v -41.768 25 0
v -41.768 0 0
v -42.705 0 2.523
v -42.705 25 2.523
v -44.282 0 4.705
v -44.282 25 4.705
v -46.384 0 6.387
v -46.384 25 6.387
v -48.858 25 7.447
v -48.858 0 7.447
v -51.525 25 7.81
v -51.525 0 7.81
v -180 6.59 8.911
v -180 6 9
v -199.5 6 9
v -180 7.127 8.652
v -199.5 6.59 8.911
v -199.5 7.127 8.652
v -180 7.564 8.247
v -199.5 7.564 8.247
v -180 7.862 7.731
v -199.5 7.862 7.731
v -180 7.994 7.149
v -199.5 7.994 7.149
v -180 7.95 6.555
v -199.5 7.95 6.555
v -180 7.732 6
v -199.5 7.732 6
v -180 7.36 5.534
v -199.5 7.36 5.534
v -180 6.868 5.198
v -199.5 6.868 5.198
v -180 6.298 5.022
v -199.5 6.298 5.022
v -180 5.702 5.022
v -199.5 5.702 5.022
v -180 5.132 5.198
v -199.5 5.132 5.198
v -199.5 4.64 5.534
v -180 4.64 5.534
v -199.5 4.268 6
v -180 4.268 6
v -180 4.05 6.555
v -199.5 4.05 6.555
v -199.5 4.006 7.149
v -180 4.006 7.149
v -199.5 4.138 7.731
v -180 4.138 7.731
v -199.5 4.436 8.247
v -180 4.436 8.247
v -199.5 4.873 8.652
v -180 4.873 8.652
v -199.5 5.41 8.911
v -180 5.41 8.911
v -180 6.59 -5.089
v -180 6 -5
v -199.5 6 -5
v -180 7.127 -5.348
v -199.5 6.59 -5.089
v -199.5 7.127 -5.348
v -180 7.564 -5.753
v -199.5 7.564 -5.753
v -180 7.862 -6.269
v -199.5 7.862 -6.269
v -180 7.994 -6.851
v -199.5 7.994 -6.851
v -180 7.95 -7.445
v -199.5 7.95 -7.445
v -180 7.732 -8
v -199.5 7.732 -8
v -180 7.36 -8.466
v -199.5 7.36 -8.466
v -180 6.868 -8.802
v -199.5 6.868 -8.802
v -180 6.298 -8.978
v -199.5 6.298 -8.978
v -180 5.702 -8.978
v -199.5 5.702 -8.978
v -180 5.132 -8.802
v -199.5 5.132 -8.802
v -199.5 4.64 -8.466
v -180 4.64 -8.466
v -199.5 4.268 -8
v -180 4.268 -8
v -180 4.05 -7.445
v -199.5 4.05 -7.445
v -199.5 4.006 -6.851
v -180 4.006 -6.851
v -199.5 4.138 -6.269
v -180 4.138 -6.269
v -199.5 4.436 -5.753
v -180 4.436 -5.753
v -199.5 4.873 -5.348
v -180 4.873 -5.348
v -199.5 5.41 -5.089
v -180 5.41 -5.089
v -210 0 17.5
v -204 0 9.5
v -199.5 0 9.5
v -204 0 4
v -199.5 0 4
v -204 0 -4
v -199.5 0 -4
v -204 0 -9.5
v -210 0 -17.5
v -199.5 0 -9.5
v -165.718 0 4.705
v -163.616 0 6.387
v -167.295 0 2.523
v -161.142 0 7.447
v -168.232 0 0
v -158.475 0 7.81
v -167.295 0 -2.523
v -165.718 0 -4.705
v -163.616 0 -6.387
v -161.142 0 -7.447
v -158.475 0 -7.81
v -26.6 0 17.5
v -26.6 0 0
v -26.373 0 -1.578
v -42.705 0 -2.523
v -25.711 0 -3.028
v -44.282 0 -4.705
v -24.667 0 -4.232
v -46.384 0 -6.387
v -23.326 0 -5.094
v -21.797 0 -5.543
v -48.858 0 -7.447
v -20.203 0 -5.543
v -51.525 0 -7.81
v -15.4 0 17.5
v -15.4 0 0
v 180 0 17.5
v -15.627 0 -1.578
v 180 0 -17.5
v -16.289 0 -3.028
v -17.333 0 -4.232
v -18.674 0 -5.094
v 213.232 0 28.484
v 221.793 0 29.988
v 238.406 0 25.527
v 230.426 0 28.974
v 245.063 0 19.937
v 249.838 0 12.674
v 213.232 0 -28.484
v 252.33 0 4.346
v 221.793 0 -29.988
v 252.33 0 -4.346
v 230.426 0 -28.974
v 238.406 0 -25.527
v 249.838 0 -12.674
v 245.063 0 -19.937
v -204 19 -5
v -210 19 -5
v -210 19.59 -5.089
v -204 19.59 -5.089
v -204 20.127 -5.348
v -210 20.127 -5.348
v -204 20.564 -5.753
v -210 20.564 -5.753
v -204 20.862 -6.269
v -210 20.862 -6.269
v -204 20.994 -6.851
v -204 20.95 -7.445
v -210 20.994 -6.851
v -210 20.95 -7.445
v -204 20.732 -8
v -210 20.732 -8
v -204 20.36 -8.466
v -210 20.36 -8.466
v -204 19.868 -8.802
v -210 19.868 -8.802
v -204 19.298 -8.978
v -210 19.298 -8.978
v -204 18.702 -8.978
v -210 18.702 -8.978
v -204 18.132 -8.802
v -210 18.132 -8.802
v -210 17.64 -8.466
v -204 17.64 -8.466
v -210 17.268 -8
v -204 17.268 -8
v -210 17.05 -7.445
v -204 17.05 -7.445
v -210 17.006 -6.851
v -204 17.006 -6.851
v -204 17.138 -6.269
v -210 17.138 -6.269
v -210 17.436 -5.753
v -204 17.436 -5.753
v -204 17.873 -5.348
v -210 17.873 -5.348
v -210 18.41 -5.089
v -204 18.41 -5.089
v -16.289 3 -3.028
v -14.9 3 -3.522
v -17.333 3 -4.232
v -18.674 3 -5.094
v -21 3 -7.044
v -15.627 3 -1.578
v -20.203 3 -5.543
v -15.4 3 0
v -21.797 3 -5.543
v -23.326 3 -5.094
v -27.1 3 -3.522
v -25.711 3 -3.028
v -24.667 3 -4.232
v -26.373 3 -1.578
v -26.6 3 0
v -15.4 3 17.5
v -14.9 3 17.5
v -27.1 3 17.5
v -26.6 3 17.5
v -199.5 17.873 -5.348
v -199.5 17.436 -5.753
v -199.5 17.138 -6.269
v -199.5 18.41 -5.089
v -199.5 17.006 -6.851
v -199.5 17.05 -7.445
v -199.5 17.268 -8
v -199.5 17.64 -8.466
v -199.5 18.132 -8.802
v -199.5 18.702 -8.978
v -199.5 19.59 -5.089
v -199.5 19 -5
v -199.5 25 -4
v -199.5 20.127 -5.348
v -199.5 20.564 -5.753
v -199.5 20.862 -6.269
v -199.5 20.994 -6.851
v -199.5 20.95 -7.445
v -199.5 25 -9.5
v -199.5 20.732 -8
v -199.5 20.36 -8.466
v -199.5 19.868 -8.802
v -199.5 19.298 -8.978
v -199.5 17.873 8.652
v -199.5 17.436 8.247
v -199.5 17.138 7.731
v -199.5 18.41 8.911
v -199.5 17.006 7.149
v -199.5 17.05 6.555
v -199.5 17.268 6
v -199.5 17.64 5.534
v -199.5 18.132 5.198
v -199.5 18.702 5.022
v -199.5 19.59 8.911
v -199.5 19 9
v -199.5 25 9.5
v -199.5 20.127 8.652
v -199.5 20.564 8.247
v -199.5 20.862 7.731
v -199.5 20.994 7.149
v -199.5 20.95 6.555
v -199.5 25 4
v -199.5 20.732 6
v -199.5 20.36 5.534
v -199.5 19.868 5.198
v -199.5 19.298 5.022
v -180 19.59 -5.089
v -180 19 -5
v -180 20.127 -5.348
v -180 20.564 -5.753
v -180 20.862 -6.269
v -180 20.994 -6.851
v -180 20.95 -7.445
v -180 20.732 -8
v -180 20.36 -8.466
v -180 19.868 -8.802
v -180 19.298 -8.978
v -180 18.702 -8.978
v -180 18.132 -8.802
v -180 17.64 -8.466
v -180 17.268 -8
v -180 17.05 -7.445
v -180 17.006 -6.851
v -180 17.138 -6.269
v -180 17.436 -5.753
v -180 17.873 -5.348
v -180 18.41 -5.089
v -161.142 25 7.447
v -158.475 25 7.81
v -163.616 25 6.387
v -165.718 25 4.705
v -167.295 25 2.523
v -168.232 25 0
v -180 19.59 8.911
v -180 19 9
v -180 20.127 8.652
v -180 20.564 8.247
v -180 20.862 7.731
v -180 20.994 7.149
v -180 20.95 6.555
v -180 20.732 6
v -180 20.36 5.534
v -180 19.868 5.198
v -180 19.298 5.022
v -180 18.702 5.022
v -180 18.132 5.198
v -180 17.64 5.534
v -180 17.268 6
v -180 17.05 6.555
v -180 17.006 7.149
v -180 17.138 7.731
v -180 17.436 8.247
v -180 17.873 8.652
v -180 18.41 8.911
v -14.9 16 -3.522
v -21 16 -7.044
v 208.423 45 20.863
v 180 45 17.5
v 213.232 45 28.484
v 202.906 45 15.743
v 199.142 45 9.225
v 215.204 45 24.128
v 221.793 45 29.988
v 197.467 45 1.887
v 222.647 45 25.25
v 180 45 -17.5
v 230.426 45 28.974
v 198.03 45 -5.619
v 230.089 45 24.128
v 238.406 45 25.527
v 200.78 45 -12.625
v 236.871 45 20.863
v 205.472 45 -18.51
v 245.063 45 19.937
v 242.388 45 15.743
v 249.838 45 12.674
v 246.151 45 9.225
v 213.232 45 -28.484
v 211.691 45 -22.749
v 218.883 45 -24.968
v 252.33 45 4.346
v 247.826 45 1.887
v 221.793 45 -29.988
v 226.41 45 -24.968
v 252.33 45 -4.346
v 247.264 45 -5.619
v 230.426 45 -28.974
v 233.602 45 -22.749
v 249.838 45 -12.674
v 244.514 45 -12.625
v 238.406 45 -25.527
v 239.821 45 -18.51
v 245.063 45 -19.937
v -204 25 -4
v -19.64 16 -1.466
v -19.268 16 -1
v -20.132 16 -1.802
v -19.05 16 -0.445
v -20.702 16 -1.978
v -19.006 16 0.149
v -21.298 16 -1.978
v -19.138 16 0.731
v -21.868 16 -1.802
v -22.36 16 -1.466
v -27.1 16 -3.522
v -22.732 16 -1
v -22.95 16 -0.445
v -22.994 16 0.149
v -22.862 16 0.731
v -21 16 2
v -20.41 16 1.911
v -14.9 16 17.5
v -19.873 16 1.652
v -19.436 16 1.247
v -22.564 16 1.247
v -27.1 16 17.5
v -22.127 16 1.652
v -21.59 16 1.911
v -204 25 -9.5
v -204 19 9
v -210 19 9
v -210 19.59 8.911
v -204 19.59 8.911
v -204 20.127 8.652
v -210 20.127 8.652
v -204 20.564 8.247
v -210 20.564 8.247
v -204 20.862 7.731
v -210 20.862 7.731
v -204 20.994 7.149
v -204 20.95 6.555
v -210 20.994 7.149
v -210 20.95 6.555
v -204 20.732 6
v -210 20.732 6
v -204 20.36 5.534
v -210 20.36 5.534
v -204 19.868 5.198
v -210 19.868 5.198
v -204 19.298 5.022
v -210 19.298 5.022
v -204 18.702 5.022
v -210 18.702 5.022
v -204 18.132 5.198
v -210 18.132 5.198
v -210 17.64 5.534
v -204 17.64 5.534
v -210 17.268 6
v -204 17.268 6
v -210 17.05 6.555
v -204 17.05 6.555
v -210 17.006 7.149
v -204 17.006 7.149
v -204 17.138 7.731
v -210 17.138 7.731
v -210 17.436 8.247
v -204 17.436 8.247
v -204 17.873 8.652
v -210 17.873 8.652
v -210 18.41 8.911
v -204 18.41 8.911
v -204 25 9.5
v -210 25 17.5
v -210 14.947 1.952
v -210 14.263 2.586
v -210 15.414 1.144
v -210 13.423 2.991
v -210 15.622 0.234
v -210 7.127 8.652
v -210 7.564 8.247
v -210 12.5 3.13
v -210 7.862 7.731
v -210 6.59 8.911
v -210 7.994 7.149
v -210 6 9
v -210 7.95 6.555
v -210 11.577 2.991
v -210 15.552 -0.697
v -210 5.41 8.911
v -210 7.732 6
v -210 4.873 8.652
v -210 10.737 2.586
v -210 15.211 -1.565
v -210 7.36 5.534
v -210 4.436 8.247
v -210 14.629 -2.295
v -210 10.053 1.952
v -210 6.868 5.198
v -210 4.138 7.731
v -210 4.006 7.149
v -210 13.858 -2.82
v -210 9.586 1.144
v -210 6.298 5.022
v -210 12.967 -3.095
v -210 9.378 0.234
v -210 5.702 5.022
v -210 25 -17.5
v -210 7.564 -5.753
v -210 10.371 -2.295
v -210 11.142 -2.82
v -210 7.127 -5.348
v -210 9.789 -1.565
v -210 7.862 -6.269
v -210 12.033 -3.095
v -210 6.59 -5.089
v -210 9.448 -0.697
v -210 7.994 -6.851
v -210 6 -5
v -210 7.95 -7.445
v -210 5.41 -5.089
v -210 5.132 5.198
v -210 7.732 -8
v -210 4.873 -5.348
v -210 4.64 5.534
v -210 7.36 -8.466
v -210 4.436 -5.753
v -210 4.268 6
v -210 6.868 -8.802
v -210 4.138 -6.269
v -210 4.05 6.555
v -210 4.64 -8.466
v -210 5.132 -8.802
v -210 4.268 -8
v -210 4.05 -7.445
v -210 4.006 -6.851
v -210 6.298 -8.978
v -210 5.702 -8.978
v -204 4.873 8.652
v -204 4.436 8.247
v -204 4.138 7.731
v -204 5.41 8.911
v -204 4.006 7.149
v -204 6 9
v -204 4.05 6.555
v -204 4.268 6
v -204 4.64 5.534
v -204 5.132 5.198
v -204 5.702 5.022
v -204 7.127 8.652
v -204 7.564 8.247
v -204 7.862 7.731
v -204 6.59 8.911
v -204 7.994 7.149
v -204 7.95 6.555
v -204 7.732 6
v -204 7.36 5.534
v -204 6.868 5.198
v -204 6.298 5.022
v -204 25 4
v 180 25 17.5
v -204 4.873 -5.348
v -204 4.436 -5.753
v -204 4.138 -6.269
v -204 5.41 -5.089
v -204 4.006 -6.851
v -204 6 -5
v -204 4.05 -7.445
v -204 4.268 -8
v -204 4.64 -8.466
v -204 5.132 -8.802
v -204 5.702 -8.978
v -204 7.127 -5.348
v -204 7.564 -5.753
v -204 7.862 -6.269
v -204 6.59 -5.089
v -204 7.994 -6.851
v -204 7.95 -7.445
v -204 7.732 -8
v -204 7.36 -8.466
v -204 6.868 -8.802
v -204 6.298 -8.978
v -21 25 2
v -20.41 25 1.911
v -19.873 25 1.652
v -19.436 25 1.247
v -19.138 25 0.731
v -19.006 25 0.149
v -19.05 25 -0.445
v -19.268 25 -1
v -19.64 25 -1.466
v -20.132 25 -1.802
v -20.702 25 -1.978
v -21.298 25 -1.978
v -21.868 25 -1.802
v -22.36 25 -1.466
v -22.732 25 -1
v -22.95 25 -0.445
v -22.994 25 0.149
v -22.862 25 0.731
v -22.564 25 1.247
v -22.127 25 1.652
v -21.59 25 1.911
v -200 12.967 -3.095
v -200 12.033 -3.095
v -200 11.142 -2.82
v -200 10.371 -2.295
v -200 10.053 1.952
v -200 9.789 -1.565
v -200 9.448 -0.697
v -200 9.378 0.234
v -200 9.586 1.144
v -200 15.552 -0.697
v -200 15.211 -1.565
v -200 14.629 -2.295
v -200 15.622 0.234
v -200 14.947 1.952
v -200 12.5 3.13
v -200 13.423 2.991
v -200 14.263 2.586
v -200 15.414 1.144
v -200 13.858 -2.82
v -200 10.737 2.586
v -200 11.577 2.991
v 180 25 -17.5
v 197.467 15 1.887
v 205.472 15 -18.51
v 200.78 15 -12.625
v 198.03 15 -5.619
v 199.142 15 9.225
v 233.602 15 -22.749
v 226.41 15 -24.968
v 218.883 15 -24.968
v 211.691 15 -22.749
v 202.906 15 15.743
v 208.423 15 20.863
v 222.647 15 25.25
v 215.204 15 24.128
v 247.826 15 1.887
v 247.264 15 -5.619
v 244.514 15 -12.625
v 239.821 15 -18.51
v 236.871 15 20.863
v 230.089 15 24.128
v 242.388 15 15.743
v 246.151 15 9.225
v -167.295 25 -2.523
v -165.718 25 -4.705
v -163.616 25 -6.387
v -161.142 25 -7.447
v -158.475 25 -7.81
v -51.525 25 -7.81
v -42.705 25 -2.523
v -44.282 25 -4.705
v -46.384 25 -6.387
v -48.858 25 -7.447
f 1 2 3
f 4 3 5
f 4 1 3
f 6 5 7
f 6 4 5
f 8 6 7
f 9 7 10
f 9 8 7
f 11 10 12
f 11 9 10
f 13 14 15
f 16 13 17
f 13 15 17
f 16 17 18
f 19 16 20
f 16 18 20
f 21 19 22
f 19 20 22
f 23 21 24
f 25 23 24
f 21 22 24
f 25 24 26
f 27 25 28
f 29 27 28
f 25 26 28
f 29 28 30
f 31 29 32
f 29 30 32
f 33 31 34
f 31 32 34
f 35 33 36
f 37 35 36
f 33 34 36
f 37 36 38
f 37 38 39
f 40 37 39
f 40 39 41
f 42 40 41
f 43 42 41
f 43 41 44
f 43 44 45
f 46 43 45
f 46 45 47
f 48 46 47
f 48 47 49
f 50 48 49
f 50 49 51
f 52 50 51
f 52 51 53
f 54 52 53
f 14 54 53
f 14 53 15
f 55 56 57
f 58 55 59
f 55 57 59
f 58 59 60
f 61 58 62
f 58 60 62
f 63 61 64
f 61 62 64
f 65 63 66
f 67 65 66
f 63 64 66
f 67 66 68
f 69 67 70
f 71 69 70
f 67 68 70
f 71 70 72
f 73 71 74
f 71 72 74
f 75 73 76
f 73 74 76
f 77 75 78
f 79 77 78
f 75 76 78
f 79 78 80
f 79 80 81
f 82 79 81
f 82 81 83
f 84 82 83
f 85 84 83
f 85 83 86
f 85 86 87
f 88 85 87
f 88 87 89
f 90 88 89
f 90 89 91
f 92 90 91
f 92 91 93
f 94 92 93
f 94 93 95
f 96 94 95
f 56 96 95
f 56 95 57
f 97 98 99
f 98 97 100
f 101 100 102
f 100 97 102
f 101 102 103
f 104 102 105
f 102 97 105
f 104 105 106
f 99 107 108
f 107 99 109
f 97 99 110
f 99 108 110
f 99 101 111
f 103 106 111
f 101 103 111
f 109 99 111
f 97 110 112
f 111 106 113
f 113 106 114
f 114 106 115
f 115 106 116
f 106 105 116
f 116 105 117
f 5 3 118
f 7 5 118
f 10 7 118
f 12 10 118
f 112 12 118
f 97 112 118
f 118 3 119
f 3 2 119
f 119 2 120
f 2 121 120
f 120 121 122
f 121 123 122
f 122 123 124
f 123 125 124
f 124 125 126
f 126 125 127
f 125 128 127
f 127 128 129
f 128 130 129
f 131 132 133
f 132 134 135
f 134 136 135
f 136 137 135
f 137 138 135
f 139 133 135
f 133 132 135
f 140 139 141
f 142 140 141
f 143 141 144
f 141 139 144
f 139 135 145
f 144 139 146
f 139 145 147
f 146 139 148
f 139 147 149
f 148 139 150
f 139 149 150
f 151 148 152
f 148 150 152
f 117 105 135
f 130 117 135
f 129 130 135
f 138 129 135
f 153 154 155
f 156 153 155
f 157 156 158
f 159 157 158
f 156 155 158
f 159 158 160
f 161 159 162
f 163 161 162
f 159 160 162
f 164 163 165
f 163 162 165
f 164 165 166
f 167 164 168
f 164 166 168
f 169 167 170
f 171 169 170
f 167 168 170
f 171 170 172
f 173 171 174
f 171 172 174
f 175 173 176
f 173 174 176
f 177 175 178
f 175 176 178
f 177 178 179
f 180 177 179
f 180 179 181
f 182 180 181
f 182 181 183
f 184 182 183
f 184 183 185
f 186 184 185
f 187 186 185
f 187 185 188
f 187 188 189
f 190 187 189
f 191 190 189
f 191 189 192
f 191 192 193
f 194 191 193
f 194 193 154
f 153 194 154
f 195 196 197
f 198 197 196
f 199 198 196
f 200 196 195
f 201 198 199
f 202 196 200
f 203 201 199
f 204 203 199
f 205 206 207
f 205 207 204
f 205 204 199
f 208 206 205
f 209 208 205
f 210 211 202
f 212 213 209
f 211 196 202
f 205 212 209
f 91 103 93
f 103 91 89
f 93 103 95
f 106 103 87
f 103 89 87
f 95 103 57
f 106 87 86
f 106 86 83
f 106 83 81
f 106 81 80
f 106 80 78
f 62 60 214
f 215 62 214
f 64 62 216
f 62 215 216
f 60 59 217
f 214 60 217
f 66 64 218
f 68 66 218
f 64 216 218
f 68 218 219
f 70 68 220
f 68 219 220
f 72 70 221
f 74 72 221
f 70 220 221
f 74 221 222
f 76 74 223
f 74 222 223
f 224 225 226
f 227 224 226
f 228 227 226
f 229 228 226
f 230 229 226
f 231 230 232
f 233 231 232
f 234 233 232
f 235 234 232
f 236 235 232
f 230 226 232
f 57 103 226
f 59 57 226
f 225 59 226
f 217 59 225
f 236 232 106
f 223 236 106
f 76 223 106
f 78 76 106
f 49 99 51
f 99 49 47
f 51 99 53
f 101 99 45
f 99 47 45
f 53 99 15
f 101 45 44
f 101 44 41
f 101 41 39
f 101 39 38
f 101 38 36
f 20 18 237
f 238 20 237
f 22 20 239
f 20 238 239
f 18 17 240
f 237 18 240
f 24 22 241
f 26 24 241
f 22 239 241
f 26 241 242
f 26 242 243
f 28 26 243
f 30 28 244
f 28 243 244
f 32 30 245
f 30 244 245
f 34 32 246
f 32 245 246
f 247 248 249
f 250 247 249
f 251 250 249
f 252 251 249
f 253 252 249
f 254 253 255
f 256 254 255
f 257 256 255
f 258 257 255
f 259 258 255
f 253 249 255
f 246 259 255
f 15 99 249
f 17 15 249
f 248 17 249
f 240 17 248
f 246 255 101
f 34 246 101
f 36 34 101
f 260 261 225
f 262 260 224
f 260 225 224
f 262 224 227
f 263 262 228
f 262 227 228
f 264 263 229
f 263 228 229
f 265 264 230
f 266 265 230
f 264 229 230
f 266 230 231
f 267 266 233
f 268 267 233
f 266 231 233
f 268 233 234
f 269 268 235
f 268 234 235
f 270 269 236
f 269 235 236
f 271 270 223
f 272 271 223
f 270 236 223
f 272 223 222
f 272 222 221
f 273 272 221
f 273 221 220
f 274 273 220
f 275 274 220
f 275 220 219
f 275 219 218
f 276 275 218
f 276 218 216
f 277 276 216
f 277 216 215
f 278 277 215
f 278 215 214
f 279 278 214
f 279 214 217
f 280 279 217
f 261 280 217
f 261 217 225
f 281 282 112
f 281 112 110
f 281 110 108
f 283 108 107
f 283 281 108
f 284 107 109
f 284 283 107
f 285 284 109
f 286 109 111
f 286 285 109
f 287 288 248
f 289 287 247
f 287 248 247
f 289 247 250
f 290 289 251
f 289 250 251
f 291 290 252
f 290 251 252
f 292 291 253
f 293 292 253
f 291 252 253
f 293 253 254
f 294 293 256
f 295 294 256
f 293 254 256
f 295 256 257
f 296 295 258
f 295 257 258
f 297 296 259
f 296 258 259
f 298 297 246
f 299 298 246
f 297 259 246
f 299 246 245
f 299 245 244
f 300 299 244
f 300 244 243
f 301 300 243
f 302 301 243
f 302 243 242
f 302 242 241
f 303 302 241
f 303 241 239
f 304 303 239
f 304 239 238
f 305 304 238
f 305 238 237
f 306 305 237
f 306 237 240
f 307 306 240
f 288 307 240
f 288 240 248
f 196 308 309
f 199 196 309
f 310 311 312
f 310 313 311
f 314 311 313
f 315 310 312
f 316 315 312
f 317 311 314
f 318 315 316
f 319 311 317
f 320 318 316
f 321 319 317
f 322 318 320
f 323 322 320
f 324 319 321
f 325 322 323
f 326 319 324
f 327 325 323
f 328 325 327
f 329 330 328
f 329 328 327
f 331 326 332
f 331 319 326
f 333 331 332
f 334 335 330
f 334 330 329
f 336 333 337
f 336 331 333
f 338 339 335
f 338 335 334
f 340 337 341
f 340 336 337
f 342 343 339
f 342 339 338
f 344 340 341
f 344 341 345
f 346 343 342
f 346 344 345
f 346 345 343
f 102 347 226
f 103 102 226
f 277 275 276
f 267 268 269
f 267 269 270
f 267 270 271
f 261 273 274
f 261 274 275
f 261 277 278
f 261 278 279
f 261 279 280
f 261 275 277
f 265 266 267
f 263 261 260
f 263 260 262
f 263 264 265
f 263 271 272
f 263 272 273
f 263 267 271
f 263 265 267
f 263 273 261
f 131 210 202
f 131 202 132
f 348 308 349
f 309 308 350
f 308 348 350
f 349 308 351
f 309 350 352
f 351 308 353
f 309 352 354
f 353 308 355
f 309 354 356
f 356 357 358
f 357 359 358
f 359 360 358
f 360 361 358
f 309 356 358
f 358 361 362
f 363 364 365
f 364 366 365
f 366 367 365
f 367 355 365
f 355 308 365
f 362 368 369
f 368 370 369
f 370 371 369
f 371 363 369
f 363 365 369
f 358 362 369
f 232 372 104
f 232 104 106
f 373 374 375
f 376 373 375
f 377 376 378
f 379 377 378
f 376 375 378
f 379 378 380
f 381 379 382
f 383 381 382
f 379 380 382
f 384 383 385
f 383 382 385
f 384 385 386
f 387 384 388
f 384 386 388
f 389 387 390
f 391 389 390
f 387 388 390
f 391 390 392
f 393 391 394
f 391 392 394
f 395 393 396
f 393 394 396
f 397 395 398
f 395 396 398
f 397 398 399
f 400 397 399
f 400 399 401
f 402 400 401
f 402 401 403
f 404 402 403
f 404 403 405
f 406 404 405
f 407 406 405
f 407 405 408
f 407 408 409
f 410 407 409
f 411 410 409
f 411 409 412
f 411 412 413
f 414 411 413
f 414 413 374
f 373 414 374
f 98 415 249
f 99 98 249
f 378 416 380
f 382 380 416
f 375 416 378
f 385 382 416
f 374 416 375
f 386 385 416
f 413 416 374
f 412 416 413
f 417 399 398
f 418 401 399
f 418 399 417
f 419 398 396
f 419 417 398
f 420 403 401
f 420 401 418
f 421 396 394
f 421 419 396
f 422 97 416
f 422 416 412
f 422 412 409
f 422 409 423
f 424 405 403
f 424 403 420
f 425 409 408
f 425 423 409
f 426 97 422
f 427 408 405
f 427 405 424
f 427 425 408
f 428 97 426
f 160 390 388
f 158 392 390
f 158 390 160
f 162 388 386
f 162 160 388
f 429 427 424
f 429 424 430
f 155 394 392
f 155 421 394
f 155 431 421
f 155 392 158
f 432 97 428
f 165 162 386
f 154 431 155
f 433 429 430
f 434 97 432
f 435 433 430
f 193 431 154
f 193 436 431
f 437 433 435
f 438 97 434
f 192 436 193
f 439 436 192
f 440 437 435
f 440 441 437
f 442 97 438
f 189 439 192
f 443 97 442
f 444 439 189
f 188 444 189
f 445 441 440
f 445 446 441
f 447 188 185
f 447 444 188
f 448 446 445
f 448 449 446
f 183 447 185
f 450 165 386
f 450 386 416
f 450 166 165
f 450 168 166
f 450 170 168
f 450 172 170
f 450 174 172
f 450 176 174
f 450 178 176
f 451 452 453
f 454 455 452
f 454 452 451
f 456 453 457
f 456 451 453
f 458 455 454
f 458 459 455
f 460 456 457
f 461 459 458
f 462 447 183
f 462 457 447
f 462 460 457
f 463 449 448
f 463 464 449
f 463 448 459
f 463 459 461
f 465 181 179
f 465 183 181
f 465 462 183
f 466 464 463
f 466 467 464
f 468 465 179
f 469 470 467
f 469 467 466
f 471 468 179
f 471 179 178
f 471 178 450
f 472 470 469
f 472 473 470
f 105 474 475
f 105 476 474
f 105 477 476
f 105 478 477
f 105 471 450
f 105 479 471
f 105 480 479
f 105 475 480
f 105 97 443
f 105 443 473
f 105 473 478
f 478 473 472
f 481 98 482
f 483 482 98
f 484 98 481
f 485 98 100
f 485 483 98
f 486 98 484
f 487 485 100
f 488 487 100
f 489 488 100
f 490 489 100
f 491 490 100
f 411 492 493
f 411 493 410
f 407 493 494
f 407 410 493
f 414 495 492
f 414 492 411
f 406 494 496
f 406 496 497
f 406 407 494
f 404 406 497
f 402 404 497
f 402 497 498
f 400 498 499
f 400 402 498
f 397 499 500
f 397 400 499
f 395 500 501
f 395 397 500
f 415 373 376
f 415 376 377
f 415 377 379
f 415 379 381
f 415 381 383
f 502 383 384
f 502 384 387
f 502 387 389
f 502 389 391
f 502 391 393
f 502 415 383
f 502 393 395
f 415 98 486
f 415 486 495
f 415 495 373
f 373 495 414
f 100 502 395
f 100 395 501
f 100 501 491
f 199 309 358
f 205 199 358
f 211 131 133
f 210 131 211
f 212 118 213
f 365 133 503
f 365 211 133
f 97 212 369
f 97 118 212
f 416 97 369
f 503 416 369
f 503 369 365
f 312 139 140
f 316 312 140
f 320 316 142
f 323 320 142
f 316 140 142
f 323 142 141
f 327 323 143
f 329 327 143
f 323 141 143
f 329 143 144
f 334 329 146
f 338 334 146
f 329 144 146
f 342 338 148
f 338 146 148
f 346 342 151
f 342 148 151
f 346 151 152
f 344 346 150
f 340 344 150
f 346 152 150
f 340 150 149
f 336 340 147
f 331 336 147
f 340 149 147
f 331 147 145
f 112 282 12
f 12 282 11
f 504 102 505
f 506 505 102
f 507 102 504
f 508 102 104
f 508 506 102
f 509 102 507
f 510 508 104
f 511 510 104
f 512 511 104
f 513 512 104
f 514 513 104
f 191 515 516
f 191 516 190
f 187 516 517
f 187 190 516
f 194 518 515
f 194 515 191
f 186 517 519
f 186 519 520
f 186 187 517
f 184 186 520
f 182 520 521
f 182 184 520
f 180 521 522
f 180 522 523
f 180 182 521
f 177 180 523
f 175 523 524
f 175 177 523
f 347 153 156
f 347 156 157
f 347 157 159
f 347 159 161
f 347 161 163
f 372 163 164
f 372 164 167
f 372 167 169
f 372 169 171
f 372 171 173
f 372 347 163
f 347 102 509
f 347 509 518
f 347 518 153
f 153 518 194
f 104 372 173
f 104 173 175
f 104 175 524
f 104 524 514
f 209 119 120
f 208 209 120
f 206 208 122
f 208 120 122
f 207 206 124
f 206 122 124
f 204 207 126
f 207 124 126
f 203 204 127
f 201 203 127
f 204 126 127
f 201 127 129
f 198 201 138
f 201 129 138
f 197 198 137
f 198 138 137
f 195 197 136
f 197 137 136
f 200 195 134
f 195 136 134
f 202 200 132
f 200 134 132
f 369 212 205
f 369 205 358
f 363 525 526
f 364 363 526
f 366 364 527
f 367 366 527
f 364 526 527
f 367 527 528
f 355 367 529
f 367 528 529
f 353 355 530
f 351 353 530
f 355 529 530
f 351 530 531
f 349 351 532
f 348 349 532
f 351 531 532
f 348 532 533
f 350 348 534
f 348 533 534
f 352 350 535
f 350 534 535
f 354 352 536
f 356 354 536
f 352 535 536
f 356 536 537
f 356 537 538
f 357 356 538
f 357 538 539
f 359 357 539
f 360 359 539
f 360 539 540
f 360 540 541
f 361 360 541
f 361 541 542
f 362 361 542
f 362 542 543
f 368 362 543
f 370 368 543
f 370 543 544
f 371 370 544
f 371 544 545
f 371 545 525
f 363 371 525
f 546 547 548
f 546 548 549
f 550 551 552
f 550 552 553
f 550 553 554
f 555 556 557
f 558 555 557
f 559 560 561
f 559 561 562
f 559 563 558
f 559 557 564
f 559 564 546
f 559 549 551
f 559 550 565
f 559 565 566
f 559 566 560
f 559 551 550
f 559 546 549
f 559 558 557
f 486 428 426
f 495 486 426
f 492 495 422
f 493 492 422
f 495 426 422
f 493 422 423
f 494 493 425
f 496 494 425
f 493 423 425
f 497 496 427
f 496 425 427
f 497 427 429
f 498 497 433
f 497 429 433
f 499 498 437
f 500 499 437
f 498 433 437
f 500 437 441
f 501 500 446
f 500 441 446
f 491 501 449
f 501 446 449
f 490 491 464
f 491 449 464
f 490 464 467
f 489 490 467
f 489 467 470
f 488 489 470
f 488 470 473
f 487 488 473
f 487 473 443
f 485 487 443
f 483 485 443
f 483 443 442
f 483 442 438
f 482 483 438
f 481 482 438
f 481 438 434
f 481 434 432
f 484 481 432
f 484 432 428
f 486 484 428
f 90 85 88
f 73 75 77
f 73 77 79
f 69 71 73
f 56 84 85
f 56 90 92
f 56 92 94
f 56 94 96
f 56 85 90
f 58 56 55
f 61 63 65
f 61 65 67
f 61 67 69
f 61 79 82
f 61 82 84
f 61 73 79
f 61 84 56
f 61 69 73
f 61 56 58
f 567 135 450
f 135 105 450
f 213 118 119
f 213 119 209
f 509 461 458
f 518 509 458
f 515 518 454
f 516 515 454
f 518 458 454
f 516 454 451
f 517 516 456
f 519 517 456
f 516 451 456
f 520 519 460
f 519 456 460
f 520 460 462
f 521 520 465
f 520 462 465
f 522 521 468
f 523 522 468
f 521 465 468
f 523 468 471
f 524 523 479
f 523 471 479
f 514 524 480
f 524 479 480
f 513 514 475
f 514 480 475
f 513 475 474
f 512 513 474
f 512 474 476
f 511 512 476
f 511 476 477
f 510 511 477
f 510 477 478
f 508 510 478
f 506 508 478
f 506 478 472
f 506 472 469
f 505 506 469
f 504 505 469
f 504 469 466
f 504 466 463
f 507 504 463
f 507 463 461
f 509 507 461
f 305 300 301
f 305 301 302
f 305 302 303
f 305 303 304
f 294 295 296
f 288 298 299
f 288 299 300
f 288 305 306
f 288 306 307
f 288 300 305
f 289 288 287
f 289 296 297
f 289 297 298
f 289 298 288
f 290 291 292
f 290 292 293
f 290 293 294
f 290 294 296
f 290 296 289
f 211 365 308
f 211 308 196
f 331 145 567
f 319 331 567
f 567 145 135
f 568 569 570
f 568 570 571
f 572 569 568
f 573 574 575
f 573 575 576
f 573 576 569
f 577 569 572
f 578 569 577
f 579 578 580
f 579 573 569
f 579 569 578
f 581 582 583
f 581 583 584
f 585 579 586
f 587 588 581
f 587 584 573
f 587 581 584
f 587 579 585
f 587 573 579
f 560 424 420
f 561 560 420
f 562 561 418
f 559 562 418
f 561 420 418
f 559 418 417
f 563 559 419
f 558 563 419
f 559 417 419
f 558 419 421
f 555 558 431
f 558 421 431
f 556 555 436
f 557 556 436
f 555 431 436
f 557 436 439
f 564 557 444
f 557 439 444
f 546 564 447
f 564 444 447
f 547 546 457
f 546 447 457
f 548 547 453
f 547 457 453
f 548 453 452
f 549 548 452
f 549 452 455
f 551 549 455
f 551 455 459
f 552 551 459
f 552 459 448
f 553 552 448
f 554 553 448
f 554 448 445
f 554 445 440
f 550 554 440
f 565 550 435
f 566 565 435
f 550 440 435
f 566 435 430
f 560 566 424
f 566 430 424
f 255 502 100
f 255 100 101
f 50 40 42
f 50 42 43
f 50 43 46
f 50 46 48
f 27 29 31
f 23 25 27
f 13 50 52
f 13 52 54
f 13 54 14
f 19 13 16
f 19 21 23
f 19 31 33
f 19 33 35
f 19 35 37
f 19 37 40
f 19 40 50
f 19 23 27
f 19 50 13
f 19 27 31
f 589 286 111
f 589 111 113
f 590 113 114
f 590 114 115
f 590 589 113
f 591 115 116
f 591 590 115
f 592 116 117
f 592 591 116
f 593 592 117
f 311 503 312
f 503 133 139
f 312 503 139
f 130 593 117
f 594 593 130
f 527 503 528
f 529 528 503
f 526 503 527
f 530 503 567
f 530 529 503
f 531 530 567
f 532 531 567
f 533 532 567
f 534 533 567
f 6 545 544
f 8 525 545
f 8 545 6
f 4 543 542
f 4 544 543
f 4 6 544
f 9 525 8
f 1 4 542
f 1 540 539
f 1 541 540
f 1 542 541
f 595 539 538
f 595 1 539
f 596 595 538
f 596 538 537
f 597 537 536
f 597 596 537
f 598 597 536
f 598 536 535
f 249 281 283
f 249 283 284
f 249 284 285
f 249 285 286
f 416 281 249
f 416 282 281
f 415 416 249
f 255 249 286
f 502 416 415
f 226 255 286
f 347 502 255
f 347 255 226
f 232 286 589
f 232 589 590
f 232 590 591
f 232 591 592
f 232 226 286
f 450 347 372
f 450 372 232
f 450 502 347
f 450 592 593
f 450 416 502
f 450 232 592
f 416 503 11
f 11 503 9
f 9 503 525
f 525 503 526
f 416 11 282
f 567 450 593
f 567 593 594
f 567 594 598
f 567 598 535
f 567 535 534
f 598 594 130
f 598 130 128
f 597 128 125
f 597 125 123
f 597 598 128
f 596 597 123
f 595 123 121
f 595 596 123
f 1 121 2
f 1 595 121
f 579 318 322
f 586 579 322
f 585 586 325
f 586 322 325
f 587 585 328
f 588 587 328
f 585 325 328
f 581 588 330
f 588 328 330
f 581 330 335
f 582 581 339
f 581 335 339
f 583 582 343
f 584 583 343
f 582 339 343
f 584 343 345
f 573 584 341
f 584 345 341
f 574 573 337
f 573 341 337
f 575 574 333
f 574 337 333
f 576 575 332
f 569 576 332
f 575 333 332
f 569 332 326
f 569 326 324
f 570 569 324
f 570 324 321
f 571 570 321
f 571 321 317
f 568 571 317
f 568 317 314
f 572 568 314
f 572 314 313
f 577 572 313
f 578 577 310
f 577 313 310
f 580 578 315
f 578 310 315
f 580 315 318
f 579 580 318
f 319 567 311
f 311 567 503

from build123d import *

# Parameters (mm, degrees)
SKETCH2_W                = 210
SKETCH2_H                = 35
BOSS_EXTRUDE1_DEPTH      = 25
SKETCH3_R                = 5.6
CUT_EXTRUDE1_DEPTH       = 213.205678529
CUT_EXTRUDE2_DEPTH       = 22
SKETCH6_W                = 22.496439662
SKETCH6_H                = 9
BOSS_EXTRUDE3_DEPTH      = 38
CUT_EXTRUDE4_DEPTH       = 17.5
SKETCH9_R                = 2
CUT_EXTRUDE5_DEPTH       = 38
SKETCH10_R               = 2
CUT_EXTRUDE6_DEPTH       = 30
SKETCH12_W               = 4.5
SKETCH12_H               = 5.5
CUT_EXTRUDE7_DEPTH       = 46
SKETCH14_W               = 126.950126738
SKETCH14_H               = 15.619509634
CUT_EXTRUDE8_DEPTH       = 40
FILLET1_R                = 10
SKETCH17_W               = 35
SKETCH17_H               = 25
BOSS_EXTRUDE5_DEPTH      = 180
BOSS_EXTRUDE4_DEPTH      = 20
BOSS_EXTRUDE4_DEPTH_BACK = 25
SKETCH18_R               = 3.130352174
CUT_EXTRUDE9_DEPTH       = 10
SKETCH20_R               = 25.25
CUT_EXTRUDE11_DEPTH      = 30


with BuildPart() as part:
    # Sketch2 → Boss-Extrude1 (new body)
    with BuildSketch(Plane(origin=(0, 0, 0), x_dir=(1, 0, 0), z_dir=(0, 1, 0))):
        with Locations((-105, 0)):
            Rectangle(SKETCH2_W, SKETCH2_H)
    extrude(amount=BOSS_EXTRUDE1_DEPTH)

    # Sketch3 → Cut-Extrude1 (cut, through all)
    with BuildSketch(Plane.XZ):
        with Locations(Location((-21, 0, 0), (0, 0, 270))):
            Circle(SKETCH3_R)
    extrude(amount=-CUT_EXTRUDE1_DEPTH, mode=Mode.SUBTRACT)

    # Sketch4 → Cut-Extrude2 (cut)
    with BuildSketch(Plane(origin=(0, 25, 0), x_dir=(1, 0, 0), z_dir=(0, 1, 0))):
        Polygon((-14.9, 3.521836642), (-21, 7.043673284), (-27.1, 3.521836642), (-27.1, -3.521836642), (-21, -7.043673284), (-14.9, -3.521836642), align=None)
    extrude(amount=-CUT_EXTRUDE2_DEPTH, mode=Mode.SUBTRACT)

    # Sketch6 → Boss-Extrude3 (add)
    with BuildSketch(Plane(origin=(0, 0, 0), x_dir=(0, 0, -1), z_dir=(1, 0, 0))):
        with Locations((0.204742288, 20.5)):
            Rectangle(SKETCH6_W, SKETCH6_H)
    extrude(amount=-BOSS_EXTRUDE3_DEPTH)

    # Sketch7 → Cut-Extrude4 (cut)
    with BuildSketch(Plane.XY.offset(17.5)):
        Polygon((-21, 16), (-14.9, 16), (-14.9, 3), (-15.4, 3), (-15.4, 0), (-26.6, 0), (-26.6, 3), (-27.1, 3), (-27.1, 16), align=None)
    extrude(amount=-CUT_EXTRUDE4_DEPTH, mode=Mode.SUBTRACT)

    # Sketch9 → Cut-Extrude5 (cut)
    with BuildSketch(Plane(origin=(0, 25, 0), x_dir=(1, 0, 0), z_dir=(0, 1, 0))):
        with Locations(Location((-21, 0, 0), (0, 0, 270))):
            Circle(SKETCH9_R)
    extrude(amount=-CUT_EXTRUDE5_DEPTH, mode=Mode.SUBTRACT)

    # Sketch10 → Cut-Extrude6 (cut)
    with BuildSketch(Plane.ZY.offset(210)):
        with Locations((7, 19)):
            Circle(SKETCH10_R)
        with Locations((7, 6)):
            Circle(SKETCH10_R)
        with Locations((-7, 6)):
            Circle(SKETCH10_R)
        with Locations((-7, 19)):
            Circle(SKETCH10_R)
    extrude(amount=-CUT_EXTRUDE6_DEPTH, mode=Mode.SUBTRACT)

    # Sketch12 → Cut-Extrude7 (cut)
    with BuildSketch(Plane(origin=(0, 25, 0), x_dir=(1, 0, 0), z_dir=(0, 1, 0))):
        with Locations((-201.75, -6.75)):
            Rectangle(SKETCH12_W, SKETCH12_H)
        with Locations((-201.75, 6.75)):
            Rectangle(SKETCH12_W, SKETCH12_H)
    extrude(amount=-CUT_EXTRUDE7_DEPTH, mode=Mode.SUBTRACT)

    # Sketch14 → Cut-Extrude8 (cut)
    with BuildSketch(Plane(origin=(0, 25, 0), x_dir=(1, 0, 0), z_dir=(0, 1, 0))):
        with Locations((-105, 0)):
            Rectangle(SKETCH14_W, SKETCH14_H)
    extrude(amount=-CUT_EXTRUDE8_DEPTH, mode=Mode.SUBTRACT)

    # Fillet1
    # the kernel refuses this fillet: 10 mm, written as the material it adds along each edge
    with BuildSketch(Plane(origin=(-168.475063369, 25, 7.809754817), x_dir=(0, 0, -1), z_dir=(0, -1, 0)), Plane(origin=(-41.524936631, 25, 7.809754817), x_dir=(-1, 0, 0), z_dir=(0, -1, 0)), Plane(origin=(-41.524936631, 25, -7.809754817), x_dir=(0, 0, 1), z_dir=(0, -1, 0))) as fillet1_piece_1:
        with BuildLine():
            CenterArc((FILLET1_R, FILLET1_R), FILLET1_R, 180, 90)
            Line((0, FILLET1_R), (0, 0))
            Line((0, 0), (FILLET1_R, 0))
        make_face()
    extrude(amount=25)
    with BuildSketch(Plane(origin=(-168.475063369, 25, -7.809754817), x_dir=(0, 0, 1), z_dir=(0, -1, 0))) as fillet1_piece_2:
        with BuildLine():
            CenterArc((FILLET1_R, -FILLET1_R), FILLET1_R, 90, 90)
            Line((0, -FILLET1_R), (0, 0))
            Line((0, 0), (FILLET1_R, 0))
        make_face()
    extrude(amount=25)

    # Sketch17 → Boss-Extrude5 (add)
    with BuildSketch(Plane(origin=(0, 0, 0), x_dir=(0, 0, -1), z_dir=(1, 0, 0))):
        with Locations((0, 12.5)):
            Rectangle(SKETCH17_W, SKETCH17_H)
    extrude(amount=BOSS_EXTRUDE5_DEPTH)

    # Sketch16 → Boss-Extrude4 (add, two sides: drawn at the far end of the back side and taken through both)
    with BuildSketch(Plane(origin=(0, 25, 0), x_dir=(1, 0, 0), z_dir=(0, 1, 0)).offset(-BOSS_EXTRUDE4_DEPTH_BACK)):
        with BuildLine():
            Line((213.231687746, 28.484303782), (180, 17.5))
            Line((180, 17.5), (180, -17.5))
            Line((180, -17.5), (213.231687746, -28.484303782))
            ThreePointArc((213.231687746, -28.484303782), (252.646805273, 0), (213.231687746, 28.484303782))
        make_face()
    extrude(amount=BOSS_EXTRUDE4_DEPTH + BOSS_EXTRUDE4_DEPTH_BACK)

    # Sketch18 → Cut-Extrude9 (cut)
    with BuildSketch(Plane.ZY.offset(210)):
        with Locations((0, 12.5)):
            Circle(SKETCH18_R)
    extrude(amount=-CUT_EXTRUDE9_DEPTH, mode=Mode.SUBTRACT)

    # Sketch20 → Cut-Extrude11 (cut)
    with BuildSketch(Plane(origin=(0, 45, 0), x_dir=(1, 0, 0), z_dir=(0, 1, 0))):
        with Locations(Location((222.646805273, 0, 0), (0, 0, 270))):
            Circle(SKETCH20_R)
    extrude(amount=-CUT_EXTRUDE11_DEPTH, mode=Mode.SUBTRACT)


solid = part.part
